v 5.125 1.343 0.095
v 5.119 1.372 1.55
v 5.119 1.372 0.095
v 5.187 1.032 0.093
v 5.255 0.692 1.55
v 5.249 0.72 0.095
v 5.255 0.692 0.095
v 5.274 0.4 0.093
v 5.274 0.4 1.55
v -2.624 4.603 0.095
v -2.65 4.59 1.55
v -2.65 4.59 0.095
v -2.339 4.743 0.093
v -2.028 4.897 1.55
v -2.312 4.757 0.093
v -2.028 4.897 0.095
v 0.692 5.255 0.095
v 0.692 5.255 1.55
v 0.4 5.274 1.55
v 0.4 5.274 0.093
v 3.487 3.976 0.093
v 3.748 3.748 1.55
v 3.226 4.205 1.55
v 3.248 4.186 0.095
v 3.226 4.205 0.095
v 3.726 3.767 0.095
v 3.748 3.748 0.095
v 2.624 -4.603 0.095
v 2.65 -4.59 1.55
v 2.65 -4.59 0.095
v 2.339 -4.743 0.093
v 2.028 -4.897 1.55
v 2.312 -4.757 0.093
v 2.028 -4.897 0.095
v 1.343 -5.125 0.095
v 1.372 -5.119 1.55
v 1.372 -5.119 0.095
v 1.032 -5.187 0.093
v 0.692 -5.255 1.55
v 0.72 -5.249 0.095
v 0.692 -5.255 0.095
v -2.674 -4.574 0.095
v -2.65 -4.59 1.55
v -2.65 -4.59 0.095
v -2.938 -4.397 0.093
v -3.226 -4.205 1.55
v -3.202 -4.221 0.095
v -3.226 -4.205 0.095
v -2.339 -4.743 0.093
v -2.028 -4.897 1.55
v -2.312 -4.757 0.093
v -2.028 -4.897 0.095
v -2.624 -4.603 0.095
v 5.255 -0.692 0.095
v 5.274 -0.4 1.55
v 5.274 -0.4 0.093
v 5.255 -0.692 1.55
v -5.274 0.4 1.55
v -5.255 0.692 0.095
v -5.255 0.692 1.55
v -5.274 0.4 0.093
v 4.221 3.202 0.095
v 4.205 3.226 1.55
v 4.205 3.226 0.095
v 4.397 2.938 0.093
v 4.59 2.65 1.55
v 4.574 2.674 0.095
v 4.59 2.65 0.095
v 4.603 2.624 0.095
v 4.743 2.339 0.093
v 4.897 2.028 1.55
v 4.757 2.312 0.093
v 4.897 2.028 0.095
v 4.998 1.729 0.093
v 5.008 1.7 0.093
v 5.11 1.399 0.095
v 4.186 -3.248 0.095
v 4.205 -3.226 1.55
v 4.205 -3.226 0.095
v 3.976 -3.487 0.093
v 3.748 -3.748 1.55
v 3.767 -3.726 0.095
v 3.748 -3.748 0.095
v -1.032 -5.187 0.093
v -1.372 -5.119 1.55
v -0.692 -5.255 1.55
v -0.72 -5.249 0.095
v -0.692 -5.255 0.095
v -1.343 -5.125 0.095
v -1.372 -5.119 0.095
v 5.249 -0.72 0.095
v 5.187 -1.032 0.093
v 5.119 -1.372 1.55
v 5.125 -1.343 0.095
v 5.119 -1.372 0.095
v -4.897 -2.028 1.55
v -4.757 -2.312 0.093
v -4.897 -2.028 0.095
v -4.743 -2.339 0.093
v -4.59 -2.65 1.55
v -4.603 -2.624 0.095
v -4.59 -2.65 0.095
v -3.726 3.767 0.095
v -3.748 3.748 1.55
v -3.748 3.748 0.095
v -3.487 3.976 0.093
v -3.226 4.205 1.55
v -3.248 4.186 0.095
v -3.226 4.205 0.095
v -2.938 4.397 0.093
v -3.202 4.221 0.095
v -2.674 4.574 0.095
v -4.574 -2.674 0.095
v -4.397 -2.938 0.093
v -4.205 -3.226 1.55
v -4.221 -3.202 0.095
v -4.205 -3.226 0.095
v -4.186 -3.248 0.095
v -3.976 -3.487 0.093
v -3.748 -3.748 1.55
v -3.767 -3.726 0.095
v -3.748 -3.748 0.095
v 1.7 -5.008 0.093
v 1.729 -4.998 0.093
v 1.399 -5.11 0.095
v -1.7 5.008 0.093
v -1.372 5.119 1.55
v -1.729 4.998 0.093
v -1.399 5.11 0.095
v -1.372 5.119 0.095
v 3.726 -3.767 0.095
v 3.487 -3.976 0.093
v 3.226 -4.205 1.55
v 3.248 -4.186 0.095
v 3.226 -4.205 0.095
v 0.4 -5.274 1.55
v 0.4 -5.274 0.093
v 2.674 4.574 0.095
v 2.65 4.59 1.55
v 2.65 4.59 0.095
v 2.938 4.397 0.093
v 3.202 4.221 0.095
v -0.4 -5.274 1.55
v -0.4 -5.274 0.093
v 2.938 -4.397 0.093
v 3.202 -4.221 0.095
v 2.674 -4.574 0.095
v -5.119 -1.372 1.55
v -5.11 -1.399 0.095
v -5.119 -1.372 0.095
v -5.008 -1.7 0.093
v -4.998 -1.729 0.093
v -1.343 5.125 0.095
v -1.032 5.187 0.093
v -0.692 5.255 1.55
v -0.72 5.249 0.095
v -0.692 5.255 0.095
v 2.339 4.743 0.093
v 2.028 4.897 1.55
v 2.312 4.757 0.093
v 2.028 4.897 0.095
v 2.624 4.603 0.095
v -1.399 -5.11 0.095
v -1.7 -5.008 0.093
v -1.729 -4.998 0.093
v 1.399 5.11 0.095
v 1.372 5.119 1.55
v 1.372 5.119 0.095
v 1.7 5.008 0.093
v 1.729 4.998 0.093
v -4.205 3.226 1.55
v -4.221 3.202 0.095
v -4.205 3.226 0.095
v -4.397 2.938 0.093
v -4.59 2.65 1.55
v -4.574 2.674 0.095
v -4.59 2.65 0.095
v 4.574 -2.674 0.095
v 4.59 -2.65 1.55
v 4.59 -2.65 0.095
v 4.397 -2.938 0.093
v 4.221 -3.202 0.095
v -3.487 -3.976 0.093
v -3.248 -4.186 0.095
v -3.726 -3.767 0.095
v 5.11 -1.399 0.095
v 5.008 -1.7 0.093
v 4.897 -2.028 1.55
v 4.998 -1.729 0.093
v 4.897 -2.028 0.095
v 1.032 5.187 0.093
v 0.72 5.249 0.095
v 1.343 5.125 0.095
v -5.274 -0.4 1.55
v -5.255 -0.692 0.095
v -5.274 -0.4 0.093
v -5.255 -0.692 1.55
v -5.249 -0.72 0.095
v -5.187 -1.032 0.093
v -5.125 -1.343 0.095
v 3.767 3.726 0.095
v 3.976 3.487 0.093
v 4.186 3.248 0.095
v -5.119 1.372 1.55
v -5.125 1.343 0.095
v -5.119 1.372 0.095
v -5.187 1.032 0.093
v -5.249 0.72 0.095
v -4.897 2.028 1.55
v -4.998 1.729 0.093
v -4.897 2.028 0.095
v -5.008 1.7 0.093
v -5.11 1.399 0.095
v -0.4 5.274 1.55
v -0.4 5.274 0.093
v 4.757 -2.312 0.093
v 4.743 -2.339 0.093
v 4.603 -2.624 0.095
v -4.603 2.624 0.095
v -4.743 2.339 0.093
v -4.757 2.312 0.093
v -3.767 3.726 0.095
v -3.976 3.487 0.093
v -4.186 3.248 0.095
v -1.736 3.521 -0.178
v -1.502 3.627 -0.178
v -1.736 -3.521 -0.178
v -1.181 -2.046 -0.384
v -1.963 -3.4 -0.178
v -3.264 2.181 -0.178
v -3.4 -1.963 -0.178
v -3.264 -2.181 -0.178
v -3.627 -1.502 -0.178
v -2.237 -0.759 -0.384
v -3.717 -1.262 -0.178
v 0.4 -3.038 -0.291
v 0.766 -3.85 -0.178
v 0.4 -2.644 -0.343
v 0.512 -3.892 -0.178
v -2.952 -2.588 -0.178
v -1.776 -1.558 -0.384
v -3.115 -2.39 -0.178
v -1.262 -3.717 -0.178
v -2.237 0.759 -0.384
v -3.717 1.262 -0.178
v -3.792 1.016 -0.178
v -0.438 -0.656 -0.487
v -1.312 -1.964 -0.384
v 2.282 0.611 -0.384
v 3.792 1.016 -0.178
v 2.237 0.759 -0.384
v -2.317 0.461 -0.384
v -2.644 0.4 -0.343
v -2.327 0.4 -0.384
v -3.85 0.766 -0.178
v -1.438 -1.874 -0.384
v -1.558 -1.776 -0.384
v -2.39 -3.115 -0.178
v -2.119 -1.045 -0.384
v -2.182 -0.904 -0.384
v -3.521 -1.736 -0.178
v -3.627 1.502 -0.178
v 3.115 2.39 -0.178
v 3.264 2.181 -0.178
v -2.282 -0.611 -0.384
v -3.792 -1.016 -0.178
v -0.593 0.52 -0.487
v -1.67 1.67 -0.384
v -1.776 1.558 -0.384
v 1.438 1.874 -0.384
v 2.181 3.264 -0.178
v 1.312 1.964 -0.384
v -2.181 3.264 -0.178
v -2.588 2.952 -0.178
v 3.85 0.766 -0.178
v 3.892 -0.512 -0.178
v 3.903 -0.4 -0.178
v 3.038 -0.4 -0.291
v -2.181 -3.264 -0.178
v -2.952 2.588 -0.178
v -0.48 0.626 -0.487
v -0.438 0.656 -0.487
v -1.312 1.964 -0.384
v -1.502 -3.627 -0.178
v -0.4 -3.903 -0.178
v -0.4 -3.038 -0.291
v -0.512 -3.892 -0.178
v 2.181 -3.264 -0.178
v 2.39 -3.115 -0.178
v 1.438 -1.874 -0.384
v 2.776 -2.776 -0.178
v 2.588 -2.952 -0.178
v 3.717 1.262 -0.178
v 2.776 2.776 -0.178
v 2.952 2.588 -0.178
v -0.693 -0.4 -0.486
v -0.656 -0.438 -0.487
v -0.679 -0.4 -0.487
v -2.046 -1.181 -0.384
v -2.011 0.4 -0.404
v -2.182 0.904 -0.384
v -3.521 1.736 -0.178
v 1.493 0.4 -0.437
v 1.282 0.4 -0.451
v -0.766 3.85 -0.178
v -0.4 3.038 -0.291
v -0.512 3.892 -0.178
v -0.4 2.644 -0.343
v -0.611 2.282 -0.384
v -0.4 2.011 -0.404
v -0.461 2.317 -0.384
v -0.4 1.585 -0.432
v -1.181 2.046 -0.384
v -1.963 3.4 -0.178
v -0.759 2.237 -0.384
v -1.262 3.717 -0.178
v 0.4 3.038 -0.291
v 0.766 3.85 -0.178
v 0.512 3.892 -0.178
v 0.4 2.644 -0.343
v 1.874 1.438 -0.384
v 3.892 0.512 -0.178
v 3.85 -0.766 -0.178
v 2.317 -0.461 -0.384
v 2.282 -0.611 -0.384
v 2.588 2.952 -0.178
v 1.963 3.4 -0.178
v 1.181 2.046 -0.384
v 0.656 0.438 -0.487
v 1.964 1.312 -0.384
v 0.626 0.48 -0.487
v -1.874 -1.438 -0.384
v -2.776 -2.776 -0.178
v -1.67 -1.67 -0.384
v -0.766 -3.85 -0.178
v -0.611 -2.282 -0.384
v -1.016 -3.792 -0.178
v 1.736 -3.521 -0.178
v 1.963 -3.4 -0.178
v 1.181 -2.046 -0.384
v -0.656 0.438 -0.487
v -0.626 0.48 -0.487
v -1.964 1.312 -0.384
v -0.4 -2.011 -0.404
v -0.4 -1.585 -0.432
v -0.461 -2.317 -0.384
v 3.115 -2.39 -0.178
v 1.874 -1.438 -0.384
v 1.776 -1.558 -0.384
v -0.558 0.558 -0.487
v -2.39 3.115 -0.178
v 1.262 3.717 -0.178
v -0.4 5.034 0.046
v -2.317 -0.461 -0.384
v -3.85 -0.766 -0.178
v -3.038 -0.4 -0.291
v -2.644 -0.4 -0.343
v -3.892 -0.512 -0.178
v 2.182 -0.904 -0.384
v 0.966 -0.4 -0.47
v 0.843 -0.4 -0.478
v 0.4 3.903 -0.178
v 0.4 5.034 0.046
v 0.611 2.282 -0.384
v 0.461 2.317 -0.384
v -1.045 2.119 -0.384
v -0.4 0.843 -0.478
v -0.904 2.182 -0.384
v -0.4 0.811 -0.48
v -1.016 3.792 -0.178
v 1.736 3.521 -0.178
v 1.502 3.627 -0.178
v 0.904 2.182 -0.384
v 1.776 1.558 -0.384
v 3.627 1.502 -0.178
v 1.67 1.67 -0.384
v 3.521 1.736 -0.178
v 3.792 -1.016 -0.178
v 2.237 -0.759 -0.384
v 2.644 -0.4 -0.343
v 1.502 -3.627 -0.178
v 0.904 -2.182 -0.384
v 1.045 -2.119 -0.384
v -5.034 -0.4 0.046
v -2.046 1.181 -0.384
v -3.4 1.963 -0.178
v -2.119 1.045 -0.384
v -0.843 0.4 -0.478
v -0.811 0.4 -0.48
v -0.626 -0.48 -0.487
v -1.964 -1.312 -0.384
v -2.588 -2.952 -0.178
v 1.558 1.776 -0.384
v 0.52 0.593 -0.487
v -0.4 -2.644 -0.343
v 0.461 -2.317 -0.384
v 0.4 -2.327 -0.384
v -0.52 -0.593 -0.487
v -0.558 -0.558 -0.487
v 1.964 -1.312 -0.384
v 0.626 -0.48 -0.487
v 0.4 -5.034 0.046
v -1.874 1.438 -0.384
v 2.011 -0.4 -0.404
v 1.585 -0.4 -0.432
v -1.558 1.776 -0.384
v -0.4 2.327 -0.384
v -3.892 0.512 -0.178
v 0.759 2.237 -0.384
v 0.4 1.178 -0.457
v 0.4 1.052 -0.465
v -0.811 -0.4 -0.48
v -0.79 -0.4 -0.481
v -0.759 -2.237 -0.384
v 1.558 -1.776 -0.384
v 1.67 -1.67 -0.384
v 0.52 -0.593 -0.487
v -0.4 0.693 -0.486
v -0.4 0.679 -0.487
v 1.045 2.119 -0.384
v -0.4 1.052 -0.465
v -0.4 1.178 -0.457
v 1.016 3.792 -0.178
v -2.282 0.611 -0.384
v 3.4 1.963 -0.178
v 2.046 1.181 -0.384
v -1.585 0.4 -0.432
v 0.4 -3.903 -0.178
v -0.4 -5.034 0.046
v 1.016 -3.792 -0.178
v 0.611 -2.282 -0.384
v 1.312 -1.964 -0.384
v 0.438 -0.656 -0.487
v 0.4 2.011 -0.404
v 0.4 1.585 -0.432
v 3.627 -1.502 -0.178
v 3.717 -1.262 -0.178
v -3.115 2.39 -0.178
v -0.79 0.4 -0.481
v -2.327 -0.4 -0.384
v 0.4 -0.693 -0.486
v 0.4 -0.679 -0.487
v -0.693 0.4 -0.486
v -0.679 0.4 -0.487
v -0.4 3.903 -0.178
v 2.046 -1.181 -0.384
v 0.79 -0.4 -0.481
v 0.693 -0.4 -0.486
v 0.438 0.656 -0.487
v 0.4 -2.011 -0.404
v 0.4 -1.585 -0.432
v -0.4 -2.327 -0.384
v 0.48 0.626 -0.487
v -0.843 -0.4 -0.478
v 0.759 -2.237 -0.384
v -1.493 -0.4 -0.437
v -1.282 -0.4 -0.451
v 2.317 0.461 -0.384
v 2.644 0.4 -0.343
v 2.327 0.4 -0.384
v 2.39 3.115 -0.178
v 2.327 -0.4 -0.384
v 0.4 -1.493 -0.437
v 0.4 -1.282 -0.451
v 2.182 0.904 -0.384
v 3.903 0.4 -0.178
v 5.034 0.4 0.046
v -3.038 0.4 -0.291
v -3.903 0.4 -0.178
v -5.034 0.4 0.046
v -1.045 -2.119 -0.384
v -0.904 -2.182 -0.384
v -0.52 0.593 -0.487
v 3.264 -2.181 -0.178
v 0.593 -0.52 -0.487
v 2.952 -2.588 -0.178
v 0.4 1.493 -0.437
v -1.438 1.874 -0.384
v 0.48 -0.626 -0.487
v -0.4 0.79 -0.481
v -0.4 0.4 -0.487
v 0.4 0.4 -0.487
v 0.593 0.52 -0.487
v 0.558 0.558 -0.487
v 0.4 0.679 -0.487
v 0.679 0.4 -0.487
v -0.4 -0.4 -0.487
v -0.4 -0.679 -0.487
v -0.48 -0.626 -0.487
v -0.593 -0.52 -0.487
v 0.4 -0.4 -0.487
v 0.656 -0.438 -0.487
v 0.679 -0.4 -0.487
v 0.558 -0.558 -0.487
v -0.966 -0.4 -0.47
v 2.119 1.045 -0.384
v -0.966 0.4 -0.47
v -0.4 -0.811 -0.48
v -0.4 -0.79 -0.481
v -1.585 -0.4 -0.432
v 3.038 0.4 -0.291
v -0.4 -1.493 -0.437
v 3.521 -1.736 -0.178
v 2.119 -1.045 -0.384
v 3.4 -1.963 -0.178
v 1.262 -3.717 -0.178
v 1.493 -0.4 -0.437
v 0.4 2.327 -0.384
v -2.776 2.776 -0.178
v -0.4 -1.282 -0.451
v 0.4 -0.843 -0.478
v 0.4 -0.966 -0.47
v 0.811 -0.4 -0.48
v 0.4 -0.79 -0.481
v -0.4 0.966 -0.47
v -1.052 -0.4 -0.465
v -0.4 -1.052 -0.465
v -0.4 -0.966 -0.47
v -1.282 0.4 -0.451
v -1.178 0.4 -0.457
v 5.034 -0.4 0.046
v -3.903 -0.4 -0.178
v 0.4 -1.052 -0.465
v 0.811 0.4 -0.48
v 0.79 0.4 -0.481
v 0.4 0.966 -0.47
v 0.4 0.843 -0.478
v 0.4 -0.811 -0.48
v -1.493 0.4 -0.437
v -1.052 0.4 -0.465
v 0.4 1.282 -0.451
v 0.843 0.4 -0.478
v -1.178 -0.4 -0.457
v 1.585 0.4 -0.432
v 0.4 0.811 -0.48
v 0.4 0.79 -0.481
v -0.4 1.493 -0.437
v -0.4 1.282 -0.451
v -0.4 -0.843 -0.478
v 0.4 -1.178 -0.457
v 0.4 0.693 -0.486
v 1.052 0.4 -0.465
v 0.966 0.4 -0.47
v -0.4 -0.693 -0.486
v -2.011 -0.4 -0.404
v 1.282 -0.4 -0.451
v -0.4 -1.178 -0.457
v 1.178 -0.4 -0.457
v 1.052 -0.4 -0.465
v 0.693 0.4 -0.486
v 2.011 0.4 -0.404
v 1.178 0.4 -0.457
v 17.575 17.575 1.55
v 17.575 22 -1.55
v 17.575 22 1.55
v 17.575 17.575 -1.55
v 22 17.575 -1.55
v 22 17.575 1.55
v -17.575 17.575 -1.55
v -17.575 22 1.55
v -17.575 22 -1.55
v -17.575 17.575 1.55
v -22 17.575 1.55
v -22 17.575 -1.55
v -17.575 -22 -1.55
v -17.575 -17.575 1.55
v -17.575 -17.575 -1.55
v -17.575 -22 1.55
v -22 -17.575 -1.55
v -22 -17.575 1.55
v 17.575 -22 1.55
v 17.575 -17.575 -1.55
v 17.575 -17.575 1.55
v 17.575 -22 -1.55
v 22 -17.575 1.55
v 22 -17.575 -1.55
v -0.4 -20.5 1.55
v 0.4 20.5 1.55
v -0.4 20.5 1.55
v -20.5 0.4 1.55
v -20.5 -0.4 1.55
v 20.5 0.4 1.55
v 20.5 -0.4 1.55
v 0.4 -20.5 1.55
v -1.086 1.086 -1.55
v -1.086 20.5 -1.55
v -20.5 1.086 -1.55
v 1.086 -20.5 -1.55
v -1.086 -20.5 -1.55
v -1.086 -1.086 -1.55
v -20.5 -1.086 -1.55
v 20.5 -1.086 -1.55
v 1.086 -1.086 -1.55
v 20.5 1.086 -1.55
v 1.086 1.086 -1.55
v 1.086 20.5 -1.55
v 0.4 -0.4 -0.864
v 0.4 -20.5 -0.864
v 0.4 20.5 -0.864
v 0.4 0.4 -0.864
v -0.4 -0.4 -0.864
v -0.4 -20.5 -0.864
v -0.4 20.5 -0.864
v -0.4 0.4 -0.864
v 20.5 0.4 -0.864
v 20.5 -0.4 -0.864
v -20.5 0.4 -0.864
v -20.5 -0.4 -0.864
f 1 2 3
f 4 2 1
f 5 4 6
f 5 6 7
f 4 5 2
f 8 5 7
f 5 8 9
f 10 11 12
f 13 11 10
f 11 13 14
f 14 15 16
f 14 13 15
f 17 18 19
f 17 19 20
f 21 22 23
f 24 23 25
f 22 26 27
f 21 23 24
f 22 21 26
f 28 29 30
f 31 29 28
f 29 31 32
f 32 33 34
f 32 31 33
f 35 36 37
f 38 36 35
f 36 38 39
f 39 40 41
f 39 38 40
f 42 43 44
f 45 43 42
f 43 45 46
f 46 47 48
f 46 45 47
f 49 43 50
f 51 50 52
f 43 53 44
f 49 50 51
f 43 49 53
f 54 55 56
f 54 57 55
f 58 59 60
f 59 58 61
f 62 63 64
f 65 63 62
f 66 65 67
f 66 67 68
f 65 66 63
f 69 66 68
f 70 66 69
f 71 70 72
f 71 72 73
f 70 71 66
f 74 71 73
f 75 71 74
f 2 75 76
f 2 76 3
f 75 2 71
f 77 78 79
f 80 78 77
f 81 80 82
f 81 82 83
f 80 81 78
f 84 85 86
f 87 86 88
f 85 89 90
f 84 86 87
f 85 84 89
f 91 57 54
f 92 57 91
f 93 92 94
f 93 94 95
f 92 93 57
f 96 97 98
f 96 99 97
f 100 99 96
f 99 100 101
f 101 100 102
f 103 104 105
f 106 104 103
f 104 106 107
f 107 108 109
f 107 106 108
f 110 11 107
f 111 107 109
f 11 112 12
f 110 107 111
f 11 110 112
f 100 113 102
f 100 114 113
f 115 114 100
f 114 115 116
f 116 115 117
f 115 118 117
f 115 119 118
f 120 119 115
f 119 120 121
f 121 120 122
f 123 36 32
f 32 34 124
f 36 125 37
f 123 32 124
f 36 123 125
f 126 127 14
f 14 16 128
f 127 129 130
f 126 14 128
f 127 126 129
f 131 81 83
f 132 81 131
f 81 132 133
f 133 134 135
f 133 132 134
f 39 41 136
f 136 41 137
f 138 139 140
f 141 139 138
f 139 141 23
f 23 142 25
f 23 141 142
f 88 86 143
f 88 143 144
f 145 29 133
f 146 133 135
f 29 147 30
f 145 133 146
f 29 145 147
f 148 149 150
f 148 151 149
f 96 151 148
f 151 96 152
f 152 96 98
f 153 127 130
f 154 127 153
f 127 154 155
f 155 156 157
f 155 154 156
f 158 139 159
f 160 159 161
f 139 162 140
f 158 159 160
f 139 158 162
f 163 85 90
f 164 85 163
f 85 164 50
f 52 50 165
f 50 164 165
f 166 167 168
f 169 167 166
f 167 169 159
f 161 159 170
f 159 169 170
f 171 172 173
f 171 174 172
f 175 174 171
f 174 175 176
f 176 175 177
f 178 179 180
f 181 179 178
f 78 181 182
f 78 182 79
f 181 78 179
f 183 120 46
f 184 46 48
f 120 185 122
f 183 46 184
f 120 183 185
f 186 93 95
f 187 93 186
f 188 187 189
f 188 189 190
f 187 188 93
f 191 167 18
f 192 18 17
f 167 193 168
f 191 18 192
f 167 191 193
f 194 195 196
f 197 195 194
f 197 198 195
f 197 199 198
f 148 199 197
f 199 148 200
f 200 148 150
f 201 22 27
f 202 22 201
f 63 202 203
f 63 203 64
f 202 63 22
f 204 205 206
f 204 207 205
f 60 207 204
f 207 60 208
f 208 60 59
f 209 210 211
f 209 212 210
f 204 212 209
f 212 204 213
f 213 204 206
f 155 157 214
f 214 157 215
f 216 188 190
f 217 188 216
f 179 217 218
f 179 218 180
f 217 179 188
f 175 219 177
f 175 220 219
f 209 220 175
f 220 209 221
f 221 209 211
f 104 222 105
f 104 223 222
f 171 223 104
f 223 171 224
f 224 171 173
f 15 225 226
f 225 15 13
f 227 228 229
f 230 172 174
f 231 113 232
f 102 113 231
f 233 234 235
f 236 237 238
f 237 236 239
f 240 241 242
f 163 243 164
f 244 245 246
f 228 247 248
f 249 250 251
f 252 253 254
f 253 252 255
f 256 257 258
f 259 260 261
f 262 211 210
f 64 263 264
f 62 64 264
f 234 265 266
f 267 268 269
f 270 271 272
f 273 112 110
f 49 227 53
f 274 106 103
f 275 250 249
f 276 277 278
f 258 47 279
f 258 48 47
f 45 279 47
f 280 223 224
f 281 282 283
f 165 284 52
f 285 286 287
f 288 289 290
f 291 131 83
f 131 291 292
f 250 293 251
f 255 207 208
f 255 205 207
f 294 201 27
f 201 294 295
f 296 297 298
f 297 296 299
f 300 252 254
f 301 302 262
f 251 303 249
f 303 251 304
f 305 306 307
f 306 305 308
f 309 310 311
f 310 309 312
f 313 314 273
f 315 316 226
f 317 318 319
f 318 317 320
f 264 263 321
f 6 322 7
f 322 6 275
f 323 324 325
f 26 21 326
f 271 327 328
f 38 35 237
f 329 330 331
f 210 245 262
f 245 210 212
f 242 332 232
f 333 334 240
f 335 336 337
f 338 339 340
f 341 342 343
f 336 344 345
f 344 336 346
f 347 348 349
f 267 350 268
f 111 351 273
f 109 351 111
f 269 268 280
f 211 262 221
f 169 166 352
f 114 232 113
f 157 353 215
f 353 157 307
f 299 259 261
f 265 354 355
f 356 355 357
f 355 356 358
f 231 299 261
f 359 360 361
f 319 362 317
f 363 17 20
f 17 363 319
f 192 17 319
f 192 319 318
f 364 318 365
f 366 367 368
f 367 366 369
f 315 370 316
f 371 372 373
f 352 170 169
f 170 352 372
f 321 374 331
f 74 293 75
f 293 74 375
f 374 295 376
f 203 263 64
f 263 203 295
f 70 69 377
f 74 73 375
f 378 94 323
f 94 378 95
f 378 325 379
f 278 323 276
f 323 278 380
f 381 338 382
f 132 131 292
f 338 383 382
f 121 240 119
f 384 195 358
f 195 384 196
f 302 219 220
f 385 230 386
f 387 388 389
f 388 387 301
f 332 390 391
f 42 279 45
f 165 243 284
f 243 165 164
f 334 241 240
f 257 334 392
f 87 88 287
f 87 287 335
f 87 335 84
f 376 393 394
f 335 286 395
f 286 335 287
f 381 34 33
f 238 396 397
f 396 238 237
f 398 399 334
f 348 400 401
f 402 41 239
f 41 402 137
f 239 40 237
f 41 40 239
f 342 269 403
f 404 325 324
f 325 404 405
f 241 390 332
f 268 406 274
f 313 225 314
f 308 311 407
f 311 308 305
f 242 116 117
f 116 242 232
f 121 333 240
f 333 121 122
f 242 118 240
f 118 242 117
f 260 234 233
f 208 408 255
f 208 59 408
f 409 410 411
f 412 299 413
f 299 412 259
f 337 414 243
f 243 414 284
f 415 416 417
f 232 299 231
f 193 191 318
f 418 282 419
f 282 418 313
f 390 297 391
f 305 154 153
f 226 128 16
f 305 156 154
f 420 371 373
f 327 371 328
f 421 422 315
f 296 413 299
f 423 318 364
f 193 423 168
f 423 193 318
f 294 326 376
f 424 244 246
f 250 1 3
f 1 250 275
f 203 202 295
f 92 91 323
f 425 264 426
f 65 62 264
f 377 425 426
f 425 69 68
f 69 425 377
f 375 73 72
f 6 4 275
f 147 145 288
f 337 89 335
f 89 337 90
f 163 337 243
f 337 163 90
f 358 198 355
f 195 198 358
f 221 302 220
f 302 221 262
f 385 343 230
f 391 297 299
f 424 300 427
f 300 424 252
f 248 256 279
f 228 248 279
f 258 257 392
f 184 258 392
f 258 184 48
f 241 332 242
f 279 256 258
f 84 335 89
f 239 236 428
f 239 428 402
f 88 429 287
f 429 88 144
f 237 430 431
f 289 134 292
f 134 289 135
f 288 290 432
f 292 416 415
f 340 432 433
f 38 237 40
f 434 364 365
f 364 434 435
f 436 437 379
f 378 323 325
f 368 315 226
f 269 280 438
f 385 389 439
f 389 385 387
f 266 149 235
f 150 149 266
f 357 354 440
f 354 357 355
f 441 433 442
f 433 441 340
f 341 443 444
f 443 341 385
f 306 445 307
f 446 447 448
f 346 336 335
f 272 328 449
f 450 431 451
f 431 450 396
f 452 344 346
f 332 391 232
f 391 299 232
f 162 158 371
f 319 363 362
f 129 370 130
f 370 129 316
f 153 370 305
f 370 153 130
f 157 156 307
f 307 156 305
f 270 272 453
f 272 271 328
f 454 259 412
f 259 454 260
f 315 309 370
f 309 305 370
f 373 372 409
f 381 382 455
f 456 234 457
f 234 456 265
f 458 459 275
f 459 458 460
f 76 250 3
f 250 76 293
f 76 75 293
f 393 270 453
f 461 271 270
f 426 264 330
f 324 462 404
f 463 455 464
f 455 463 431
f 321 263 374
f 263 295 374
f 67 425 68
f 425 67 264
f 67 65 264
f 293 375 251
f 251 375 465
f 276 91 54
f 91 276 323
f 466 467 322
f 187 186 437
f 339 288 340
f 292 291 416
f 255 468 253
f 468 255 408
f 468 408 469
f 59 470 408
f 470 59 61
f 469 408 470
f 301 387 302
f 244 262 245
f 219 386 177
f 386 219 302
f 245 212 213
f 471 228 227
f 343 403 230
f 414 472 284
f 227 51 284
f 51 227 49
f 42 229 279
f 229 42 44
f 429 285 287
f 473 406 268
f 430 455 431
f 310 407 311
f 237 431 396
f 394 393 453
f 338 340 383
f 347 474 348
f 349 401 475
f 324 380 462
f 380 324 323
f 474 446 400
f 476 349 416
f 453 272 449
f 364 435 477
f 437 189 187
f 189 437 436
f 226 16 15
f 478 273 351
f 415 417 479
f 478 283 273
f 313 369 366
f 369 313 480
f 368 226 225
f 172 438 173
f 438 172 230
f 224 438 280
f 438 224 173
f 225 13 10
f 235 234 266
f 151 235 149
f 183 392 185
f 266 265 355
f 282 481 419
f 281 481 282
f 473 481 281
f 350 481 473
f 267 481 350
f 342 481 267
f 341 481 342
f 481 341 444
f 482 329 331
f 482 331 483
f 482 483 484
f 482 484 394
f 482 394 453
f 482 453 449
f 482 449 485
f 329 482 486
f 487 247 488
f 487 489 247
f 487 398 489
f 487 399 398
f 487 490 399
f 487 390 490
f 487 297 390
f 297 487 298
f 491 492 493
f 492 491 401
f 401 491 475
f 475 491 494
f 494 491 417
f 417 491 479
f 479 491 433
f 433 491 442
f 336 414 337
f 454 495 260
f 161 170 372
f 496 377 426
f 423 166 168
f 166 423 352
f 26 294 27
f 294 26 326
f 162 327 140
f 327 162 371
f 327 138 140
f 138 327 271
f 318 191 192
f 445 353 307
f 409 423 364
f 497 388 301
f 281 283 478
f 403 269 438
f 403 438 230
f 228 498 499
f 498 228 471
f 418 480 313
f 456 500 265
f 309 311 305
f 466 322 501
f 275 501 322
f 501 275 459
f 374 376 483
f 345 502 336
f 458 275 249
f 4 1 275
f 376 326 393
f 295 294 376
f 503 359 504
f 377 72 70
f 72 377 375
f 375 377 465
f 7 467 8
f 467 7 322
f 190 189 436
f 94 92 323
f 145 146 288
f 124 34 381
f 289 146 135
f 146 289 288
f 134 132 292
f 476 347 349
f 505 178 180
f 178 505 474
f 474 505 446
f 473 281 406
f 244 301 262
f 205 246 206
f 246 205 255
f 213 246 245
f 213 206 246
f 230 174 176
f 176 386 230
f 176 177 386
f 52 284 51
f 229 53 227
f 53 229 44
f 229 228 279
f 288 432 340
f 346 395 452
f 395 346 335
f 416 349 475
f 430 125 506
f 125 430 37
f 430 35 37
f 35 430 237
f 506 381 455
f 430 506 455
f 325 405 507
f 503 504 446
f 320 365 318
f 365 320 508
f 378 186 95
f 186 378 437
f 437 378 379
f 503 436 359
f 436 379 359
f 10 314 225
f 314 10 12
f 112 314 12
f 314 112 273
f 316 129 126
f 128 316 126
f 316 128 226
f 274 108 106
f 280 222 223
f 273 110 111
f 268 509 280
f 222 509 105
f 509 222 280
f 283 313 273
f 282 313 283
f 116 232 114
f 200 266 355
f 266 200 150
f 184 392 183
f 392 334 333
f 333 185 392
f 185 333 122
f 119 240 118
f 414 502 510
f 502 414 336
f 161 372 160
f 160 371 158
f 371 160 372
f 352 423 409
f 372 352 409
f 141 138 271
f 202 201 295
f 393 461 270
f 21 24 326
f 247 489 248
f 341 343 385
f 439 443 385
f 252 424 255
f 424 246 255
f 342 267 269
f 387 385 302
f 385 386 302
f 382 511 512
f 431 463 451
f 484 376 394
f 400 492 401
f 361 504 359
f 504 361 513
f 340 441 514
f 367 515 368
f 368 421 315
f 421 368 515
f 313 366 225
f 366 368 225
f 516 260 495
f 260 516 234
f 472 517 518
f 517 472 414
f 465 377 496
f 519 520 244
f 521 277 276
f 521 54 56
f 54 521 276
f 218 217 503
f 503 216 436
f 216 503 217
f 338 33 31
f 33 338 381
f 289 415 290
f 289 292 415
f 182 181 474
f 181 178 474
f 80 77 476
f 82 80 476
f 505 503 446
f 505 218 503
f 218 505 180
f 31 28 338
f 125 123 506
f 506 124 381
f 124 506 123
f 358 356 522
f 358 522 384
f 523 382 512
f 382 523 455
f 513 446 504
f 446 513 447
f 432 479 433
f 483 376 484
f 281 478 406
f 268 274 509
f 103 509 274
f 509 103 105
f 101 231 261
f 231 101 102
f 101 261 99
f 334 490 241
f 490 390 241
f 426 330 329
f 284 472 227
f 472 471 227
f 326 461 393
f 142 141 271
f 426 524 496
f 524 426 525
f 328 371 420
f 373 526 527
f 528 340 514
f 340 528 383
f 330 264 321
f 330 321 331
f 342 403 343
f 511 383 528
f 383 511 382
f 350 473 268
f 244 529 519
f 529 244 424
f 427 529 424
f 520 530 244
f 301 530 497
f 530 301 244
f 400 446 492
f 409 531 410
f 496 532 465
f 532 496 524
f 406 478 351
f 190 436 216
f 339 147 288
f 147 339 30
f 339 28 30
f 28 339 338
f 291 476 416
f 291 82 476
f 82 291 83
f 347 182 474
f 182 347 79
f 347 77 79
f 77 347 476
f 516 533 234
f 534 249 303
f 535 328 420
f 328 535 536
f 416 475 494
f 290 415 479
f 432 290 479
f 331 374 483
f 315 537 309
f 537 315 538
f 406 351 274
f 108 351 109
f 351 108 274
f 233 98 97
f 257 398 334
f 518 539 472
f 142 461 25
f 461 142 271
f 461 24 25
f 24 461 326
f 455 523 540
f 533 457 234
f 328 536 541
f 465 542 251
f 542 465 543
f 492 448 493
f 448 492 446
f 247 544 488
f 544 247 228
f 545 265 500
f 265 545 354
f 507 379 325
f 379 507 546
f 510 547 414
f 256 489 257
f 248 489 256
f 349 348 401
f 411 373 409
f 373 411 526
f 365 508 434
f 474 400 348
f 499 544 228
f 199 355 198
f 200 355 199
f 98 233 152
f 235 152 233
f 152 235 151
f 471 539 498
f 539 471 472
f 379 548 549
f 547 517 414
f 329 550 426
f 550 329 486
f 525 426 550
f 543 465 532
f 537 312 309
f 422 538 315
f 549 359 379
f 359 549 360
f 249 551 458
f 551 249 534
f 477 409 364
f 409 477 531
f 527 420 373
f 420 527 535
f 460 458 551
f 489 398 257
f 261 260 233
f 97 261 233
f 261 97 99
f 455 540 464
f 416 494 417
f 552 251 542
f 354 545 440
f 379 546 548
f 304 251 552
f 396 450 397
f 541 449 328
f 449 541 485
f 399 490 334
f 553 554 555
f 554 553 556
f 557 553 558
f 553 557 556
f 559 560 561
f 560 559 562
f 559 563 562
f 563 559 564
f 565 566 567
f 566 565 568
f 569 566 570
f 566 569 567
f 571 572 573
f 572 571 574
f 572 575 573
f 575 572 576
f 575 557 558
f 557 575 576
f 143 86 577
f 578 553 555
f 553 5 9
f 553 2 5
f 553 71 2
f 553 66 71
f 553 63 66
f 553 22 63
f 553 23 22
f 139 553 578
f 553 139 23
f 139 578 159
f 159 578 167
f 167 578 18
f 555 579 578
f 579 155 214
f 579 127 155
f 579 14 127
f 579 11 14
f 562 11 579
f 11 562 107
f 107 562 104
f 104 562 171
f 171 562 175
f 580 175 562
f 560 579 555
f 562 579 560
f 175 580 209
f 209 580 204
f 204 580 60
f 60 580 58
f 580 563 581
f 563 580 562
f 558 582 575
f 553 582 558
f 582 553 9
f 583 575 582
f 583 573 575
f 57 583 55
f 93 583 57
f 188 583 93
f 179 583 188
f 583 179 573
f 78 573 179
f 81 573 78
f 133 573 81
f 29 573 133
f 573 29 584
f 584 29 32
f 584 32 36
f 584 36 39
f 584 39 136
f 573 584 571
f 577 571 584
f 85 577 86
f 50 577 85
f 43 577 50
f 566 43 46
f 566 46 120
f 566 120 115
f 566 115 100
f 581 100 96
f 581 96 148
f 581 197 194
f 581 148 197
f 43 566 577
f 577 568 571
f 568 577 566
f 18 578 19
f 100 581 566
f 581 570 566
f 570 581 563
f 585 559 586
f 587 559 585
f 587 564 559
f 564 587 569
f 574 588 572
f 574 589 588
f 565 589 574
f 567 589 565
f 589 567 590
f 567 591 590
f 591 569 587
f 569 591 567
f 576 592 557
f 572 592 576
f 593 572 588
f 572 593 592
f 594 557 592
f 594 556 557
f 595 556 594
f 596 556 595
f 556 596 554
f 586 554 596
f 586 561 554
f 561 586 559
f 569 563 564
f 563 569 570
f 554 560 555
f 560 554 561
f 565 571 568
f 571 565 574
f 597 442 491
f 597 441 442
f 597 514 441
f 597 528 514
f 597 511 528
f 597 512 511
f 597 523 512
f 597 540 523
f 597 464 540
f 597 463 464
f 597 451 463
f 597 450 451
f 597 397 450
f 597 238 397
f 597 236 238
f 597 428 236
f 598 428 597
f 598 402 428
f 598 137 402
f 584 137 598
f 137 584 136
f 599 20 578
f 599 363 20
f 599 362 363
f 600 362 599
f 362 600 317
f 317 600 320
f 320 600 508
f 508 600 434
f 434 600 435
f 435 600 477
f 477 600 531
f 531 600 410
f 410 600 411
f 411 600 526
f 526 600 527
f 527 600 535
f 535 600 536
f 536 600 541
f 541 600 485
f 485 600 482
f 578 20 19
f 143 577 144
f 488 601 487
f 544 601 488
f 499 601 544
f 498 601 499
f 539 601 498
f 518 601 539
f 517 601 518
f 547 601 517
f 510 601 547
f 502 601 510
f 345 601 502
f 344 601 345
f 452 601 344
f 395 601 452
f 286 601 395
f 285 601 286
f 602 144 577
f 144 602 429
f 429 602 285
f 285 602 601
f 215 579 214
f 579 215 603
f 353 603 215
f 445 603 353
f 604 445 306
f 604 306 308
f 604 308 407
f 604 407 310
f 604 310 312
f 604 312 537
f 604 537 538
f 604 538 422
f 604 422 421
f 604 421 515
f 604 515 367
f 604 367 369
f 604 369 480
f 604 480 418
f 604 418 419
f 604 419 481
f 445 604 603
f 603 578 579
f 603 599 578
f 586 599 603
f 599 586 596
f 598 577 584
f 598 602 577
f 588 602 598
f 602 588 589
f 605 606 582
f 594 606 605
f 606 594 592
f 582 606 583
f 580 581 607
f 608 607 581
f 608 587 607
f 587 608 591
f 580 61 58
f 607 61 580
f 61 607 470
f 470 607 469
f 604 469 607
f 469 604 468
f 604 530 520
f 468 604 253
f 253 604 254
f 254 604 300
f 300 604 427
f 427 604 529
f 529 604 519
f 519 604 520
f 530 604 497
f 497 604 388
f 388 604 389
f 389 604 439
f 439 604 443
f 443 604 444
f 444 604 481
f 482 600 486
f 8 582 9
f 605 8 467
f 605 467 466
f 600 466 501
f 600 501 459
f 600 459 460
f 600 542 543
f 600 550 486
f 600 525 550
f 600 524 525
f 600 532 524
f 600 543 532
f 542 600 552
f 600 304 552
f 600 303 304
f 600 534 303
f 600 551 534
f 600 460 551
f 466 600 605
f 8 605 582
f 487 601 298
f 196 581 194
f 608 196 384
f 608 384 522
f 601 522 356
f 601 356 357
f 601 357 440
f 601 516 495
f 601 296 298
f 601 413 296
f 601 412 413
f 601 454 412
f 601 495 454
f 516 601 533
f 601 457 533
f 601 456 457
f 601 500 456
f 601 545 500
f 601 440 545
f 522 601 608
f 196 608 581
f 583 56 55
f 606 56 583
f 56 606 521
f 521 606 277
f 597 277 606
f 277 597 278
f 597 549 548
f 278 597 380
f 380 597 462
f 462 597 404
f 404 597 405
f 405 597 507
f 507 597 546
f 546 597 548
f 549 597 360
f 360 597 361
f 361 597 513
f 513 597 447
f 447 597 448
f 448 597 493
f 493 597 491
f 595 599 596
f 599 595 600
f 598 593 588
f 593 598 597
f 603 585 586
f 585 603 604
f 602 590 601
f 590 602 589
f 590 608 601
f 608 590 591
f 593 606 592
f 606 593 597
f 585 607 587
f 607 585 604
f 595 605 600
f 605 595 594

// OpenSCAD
// [FL_INDEX: keywords="openscad, 3d_parametric, Pill_cutting_base, csg_solid" | COT="Parametric OpenSCAD design from 3DCodeverse"]
// Title: Pill cutting base

//Pill diameter
pd=9.6;//

//Pill hight1 
pt=4.2;//

//Pill hight2
pt2=2.6;//

//Parts sellect
part="top";//[pill,top,bottom]  

pc=(pt-pt2)/2;//Convex value
sp=pd/(tan(2*atan(2*pc/pd))*2)+pd;// convex diameter

//Base hight
bh=pt/2+1;

//echo(sp);// convex diameter

module pill()
{
rotate([0,0,0])intersection(){
cylinder(h=10,r=pd/2+0.5,center=true,$fn=48);
translate([0,0,-sp+(pt2-0.5)])sphere(r=sp+0.5,center=true,$fn=96);
translate([0,0,sp-(pt2-0.5)])sphere(r=sp+0.5,center=true,$fn=96);
								}
}

module post()
{
translate([21,21,bh/2])cube(size=[5,5,bh*2], center=true);
translate([-21,21,bh/2])cube(size=[5,5,bh*2], center=true);
translate([-21,-21,bh/2])cube(size=[5,5,bh*2], center=true);
translate([21,-21,bh/2])cube(size=[5,5,bh*2], center=true);
}

union(){
if(part=="pill") {
		translate([0,0,0])pill();
				 }
		else if (part=="bottom"){
union(){
difference(){
cube(size=[46,46,bh], center=true);
translate([0,0,pt/2])pill();
translate([-0.4,-20.5,-1])cube(size=[0.8,41,20], center=false);
translate([-20.5,-0.4,-1])cube(size=[41,0.8,20], center=false);
			}
post();
		}
					}
				else if (part=="top"){
translate([0,0,0]){
difference(){
		cube(size=[44,44,bh], center=true);
		translate([0,0,pt/2])pill();
		translate([-0.4,-20.5,-10])cube(size=[0.8,41,20], center=false);
		translate([-20.5,-0.4,-10])cube(size=[41,0.8,20], center=false);
		translate([0,0,-4])rotate([0,45,0])cube(size=[5,41,5], center=true);
		translate([0,0,-4])rotate([45,0,0])cube(size=[41,5,5], center=true);
		translate([0,0,-pt])scale([0.95,0.95,2])post();

			}
		}
					}
					}
